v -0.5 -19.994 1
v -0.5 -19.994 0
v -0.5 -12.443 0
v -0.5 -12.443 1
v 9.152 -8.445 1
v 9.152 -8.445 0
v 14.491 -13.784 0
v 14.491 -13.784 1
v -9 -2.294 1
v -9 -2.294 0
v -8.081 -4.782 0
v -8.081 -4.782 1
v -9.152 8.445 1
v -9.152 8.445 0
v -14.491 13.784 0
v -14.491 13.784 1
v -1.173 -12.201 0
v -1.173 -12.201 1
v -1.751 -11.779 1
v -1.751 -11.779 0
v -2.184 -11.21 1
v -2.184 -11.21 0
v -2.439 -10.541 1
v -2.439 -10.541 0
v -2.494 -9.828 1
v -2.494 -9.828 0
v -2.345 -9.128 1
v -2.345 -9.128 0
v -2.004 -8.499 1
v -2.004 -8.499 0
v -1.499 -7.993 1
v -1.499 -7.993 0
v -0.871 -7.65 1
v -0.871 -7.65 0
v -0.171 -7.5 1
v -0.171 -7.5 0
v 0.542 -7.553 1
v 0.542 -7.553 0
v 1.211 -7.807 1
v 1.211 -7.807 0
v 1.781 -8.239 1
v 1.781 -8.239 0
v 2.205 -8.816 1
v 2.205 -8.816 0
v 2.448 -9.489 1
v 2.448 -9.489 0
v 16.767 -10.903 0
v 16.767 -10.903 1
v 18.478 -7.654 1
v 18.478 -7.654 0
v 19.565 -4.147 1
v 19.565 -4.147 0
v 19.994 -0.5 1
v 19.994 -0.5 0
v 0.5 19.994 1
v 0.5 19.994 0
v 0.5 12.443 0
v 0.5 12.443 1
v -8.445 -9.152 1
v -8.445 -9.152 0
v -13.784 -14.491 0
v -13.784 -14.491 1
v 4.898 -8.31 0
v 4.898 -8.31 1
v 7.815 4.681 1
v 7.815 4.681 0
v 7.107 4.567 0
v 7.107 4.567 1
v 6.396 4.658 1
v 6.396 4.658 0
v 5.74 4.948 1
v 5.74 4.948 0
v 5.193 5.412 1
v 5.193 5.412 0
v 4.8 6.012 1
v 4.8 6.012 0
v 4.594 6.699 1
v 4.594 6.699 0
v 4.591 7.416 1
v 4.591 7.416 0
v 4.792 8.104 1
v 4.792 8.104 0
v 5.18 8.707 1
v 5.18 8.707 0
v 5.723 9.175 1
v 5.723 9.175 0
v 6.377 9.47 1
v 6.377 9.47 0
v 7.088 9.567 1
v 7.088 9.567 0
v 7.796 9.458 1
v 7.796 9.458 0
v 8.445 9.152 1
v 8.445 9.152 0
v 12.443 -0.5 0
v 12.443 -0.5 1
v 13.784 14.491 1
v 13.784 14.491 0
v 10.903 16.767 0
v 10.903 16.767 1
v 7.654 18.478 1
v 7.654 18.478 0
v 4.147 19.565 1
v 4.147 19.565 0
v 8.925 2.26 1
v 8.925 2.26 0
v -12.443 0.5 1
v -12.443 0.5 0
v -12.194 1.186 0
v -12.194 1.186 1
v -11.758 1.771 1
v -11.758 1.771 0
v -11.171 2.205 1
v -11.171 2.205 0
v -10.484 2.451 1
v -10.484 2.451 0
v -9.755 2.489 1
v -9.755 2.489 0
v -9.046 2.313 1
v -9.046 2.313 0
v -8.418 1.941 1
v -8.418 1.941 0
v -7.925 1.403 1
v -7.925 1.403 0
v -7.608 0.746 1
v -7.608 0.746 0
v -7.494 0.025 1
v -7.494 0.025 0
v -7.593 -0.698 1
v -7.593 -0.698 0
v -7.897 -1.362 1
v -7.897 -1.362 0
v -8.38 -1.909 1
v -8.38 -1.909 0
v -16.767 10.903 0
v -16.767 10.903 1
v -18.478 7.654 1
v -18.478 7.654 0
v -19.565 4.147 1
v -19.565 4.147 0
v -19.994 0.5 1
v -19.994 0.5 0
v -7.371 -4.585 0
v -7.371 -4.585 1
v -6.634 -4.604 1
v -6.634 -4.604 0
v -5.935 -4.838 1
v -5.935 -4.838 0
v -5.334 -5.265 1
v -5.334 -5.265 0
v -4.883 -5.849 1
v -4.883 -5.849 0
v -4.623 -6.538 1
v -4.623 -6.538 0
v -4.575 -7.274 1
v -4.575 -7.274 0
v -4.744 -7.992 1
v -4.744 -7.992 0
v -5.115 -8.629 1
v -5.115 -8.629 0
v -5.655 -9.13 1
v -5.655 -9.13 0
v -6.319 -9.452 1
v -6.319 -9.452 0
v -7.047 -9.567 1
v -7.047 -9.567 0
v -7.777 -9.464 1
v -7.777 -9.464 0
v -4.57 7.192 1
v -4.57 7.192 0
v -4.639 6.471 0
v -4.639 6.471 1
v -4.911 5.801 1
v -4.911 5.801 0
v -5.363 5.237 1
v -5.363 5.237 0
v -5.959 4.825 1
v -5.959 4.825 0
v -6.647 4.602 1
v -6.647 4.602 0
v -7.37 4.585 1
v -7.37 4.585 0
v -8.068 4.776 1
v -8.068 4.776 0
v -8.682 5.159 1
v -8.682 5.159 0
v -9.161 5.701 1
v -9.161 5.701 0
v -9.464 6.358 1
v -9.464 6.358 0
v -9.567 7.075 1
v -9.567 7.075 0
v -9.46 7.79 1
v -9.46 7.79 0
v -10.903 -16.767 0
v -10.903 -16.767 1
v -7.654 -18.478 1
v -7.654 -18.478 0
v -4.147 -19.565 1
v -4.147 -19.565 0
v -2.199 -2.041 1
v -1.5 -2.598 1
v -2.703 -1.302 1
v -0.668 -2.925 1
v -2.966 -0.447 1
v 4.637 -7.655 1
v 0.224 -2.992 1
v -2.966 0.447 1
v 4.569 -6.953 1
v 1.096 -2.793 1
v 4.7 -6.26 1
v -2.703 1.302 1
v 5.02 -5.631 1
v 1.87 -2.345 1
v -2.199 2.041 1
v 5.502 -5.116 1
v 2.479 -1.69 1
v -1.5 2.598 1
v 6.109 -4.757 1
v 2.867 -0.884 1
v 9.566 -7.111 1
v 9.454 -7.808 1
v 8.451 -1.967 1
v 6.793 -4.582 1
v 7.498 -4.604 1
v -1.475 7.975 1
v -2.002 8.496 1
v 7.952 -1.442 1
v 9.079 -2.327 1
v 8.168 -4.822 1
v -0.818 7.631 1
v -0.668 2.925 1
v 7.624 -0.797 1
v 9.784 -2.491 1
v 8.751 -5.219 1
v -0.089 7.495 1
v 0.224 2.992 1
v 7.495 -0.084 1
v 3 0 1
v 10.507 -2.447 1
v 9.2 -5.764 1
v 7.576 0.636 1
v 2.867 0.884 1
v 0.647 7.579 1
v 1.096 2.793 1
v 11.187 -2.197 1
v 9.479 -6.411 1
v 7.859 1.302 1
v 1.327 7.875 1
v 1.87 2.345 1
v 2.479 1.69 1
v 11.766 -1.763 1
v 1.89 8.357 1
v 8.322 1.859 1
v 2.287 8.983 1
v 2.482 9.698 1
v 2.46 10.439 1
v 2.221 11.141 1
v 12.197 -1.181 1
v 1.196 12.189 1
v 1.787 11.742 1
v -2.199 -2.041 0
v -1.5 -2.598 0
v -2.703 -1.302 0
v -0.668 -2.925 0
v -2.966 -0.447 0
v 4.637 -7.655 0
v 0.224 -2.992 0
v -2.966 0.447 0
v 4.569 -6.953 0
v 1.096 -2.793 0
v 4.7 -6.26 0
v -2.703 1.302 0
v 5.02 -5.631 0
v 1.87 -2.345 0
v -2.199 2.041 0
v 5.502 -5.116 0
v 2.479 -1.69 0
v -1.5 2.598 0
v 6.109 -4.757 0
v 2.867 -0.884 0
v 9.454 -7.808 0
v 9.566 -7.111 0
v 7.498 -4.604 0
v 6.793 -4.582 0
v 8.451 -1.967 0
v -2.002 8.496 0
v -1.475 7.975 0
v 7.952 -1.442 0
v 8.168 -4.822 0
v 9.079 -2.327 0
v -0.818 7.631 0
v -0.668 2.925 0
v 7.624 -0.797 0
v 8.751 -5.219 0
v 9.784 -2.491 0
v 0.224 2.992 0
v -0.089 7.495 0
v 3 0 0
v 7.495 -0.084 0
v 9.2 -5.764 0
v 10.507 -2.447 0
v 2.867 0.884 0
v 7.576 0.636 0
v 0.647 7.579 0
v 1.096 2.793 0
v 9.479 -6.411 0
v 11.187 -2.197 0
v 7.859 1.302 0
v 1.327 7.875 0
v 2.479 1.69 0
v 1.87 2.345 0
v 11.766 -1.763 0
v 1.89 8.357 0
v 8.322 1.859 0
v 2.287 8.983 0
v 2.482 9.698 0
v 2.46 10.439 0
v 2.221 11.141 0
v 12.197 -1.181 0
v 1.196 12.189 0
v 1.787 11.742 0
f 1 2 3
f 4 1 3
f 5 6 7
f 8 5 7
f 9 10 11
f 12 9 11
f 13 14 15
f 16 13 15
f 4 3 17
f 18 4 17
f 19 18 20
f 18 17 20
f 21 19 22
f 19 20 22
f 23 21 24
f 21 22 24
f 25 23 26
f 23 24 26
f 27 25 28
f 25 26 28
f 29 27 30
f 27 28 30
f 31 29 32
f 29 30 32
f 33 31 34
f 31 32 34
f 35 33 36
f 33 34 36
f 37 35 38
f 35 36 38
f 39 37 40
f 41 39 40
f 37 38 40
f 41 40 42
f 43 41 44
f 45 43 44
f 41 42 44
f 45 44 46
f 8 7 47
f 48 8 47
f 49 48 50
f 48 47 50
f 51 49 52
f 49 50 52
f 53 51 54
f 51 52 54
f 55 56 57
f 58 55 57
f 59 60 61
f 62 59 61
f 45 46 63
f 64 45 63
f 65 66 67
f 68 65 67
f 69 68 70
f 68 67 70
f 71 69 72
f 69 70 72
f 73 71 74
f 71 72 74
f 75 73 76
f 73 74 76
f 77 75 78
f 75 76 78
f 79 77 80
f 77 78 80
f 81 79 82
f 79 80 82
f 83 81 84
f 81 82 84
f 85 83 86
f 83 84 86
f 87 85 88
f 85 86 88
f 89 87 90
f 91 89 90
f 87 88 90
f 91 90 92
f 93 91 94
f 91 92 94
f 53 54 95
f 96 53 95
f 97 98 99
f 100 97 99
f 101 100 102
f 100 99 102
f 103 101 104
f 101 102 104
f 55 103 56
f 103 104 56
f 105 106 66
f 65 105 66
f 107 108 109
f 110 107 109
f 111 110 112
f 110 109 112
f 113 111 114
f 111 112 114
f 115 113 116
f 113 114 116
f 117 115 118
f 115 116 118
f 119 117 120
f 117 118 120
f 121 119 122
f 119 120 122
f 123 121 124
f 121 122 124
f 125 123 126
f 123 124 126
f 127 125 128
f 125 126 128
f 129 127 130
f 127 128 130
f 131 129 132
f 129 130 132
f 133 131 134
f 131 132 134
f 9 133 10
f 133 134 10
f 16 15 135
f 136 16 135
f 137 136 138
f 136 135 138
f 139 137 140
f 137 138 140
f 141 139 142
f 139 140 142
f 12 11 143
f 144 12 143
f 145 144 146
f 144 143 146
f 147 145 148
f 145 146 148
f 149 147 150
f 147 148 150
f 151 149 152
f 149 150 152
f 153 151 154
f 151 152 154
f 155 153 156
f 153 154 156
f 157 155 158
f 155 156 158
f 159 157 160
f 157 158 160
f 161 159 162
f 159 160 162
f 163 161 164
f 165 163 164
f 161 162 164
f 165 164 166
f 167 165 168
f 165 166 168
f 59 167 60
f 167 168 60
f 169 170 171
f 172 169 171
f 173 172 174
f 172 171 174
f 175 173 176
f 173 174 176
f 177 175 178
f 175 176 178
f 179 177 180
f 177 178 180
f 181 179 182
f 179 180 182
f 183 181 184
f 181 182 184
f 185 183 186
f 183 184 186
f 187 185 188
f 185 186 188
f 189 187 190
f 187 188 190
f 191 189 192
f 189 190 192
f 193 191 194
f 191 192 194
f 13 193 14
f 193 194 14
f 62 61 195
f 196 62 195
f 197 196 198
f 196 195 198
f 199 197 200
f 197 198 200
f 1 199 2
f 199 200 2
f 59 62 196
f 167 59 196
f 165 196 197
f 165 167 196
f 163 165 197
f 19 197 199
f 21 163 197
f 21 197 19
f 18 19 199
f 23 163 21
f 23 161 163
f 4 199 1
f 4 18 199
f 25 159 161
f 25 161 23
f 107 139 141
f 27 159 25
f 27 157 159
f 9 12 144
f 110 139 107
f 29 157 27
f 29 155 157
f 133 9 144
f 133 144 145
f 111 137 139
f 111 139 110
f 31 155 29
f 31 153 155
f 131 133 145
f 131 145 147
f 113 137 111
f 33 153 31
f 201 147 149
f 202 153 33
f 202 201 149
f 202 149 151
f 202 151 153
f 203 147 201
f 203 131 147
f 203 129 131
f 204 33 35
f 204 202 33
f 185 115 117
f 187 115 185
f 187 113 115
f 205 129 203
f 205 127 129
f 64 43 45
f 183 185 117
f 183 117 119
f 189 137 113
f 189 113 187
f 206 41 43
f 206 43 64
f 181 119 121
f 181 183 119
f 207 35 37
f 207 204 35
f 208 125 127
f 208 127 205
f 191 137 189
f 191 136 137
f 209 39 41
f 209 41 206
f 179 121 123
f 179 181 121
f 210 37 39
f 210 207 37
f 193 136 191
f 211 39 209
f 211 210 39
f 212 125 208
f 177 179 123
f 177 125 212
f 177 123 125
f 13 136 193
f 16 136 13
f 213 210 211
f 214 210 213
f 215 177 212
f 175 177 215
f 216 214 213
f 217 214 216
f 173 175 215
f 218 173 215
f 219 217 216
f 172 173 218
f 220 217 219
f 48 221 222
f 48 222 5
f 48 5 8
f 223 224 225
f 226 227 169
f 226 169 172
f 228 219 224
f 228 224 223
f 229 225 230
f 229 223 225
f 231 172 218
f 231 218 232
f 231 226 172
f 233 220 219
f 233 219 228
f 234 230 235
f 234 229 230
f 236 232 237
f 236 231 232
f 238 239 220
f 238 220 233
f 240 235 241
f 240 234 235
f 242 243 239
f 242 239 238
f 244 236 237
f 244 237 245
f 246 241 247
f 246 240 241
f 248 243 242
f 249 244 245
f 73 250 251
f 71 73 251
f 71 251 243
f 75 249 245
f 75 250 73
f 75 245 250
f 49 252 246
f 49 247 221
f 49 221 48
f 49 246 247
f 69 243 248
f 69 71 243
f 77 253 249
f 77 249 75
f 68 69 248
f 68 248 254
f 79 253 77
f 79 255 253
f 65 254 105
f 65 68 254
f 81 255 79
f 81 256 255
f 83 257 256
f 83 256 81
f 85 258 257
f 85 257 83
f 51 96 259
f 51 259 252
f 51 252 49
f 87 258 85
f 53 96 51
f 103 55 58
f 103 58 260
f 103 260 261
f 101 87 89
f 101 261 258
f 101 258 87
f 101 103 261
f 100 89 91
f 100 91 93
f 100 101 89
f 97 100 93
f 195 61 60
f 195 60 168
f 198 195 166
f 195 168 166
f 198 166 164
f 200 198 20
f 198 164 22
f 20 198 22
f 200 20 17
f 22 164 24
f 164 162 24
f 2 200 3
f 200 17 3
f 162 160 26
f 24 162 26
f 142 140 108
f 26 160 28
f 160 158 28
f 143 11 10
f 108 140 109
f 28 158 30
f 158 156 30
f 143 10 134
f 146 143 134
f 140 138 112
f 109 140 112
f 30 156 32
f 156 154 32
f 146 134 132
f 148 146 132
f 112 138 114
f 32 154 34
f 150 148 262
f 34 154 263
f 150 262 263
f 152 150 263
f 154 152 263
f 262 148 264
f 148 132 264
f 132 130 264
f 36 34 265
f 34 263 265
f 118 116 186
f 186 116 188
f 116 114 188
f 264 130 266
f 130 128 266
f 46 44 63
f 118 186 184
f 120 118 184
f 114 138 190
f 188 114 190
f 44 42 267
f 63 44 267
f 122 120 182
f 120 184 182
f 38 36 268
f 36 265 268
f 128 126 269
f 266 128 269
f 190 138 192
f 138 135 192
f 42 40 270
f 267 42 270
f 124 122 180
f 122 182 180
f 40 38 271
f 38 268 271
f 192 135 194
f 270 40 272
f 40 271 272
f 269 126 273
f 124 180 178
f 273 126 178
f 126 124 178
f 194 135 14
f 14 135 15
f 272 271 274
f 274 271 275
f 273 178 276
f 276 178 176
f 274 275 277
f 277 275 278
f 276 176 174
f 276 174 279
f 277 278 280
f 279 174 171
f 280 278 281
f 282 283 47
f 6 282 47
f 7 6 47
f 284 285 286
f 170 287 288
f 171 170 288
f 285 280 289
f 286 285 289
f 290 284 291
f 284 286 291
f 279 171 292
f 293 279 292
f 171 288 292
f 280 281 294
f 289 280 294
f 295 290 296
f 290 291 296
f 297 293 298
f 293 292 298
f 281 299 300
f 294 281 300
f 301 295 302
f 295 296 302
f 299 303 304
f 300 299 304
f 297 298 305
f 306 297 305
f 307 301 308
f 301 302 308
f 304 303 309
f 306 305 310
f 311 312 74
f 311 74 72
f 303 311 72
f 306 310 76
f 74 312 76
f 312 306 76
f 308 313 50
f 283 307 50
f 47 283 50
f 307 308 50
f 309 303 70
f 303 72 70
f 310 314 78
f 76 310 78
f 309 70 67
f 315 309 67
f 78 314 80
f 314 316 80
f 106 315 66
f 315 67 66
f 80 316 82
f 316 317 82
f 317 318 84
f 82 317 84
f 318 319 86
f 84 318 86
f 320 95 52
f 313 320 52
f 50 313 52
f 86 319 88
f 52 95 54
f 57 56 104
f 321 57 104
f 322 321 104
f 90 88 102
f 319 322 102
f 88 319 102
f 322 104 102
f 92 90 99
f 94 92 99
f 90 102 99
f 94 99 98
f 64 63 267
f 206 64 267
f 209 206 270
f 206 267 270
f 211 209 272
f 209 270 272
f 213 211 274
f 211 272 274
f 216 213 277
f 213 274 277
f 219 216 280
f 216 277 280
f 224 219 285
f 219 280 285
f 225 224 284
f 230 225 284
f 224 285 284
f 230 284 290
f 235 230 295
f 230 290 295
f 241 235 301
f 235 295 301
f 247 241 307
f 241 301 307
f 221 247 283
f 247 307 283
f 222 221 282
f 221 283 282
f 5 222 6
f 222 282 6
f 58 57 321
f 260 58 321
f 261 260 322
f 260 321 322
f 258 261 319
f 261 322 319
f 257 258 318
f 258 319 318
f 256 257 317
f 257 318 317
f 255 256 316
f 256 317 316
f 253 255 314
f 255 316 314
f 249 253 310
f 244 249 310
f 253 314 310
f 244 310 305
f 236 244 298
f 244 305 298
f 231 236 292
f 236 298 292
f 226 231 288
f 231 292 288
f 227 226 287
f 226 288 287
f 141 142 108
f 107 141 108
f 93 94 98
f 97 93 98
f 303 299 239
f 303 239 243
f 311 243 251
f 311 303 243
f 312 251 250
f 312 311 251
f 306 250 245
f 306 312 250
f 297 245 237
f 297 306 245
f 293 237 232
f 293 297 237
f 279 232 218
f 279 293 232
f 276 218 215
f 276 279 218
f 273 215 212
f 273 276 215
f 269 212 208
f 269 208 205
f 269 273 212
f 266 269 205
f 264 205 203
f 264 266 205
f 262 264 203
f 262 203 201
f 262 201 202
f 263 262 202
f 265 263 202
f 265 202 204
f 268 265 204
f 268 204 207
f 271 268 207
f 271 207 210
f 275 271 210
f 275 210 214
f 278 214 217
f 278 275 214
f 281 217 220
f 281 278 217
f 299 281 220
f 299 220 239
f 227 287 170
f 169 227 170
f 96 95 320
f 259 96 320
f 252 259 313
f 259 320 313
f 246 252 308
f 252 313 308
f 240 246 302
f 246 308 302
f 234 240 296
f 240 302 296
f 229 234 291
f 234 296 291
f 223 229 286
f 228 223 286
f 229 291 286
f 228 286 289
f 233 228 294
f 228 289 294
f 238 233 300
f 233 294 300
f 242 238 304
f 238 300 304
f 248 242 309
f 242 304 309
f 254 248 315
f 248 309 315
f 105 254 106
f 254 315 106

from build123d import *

# Parameters (mm, degrees)
F0_R     = 3
F1_DEPTH = 1


with BuildPart() as f1:
    # F0 (on Top) → F1 (new body)
    with BuildSketch(Plane.XY):
        with BuildLine():
            ThreePointArc((14.491269, -13.784162), (18.477591, -7.653669), (19.993749, -0.5))
            Line((19.993749, -0.5), (12.443239, -0.5))
            ThreePointArc((12.443239, -0.5), (8.450707, -1.966982), (8.924937, 2.260009))
            Line((8.924937, 2.260009), (7.814871, 4.681242))
            ThreePointArc((7.814871, 4.681242), (4.591124, 7.41562), (8.445145, 9.152252))
            Line((8.445145, 9.152252), (13.784162, 14.491269))
            ThreePointArc((13.784162, 14.491269), (7.653669, 18.477591), (0.5, 19.993749))
            Line((0.5, 19.993749), (0.5, 12.443239))
            ThreePointArc((0.5, 12.443239), (2.111531, 8.655304), (-2.001884, 8.496265))
            Line((-2.001884, 8.496265), (-4.569773, 7.19161))
            ThreePointArc((-4.569773, 7.19161), (-7.726287, 4.655242), (-9.152252, 8.445145))
            Line((-9.152252, 8.445145), (-14.491269, 13.784162))
            ThreePointArc((-14.491269, 13.784162), (-18.477591, 7.653669), (-19.993749, 0.5))
            Line((-19.993749, 0.5), (-12.443239, 0.5))
            ThreePointArc((-12.443239, 0.5), (-8.418362, 1.941174), (-9.000323, -2.294146))
            Line((-9.000323, -2.294146), (-8.081482, -4.781892))
            ThreePointArc((-8.081482, -4.781892), (-4.575258, -7.273959), (-8.445145, -9.152252))
            Line((-8.445145, -9.152252), (-13.784162, -14.491269))
            ThreePointArc((-13.784162, -14.491269), (-7.653669, -18.477591), (-0.5, -19.993749))
            Line((-0.5, -19.993749), (-0.5, -12.443239))
            ThreePointArc((-0.5, -12.443239), (-1.769645, -8.227862), (2.448421, -9.488543))
            Line((2.448421, -9.488543), (4.89789, -8.310227))
            ThreePointArc((4.89789, -8.310227), (7.14589, -4.567904), (9.152252, -8.445145))
            Line((9.152252, -8.445145), (14.491269, -13.784162))
        make_face()
        Circle(F0_R, mode=Mode.SUBTRACT)
    extrude(amount=F1_DEPTH)


solid = f1.part
